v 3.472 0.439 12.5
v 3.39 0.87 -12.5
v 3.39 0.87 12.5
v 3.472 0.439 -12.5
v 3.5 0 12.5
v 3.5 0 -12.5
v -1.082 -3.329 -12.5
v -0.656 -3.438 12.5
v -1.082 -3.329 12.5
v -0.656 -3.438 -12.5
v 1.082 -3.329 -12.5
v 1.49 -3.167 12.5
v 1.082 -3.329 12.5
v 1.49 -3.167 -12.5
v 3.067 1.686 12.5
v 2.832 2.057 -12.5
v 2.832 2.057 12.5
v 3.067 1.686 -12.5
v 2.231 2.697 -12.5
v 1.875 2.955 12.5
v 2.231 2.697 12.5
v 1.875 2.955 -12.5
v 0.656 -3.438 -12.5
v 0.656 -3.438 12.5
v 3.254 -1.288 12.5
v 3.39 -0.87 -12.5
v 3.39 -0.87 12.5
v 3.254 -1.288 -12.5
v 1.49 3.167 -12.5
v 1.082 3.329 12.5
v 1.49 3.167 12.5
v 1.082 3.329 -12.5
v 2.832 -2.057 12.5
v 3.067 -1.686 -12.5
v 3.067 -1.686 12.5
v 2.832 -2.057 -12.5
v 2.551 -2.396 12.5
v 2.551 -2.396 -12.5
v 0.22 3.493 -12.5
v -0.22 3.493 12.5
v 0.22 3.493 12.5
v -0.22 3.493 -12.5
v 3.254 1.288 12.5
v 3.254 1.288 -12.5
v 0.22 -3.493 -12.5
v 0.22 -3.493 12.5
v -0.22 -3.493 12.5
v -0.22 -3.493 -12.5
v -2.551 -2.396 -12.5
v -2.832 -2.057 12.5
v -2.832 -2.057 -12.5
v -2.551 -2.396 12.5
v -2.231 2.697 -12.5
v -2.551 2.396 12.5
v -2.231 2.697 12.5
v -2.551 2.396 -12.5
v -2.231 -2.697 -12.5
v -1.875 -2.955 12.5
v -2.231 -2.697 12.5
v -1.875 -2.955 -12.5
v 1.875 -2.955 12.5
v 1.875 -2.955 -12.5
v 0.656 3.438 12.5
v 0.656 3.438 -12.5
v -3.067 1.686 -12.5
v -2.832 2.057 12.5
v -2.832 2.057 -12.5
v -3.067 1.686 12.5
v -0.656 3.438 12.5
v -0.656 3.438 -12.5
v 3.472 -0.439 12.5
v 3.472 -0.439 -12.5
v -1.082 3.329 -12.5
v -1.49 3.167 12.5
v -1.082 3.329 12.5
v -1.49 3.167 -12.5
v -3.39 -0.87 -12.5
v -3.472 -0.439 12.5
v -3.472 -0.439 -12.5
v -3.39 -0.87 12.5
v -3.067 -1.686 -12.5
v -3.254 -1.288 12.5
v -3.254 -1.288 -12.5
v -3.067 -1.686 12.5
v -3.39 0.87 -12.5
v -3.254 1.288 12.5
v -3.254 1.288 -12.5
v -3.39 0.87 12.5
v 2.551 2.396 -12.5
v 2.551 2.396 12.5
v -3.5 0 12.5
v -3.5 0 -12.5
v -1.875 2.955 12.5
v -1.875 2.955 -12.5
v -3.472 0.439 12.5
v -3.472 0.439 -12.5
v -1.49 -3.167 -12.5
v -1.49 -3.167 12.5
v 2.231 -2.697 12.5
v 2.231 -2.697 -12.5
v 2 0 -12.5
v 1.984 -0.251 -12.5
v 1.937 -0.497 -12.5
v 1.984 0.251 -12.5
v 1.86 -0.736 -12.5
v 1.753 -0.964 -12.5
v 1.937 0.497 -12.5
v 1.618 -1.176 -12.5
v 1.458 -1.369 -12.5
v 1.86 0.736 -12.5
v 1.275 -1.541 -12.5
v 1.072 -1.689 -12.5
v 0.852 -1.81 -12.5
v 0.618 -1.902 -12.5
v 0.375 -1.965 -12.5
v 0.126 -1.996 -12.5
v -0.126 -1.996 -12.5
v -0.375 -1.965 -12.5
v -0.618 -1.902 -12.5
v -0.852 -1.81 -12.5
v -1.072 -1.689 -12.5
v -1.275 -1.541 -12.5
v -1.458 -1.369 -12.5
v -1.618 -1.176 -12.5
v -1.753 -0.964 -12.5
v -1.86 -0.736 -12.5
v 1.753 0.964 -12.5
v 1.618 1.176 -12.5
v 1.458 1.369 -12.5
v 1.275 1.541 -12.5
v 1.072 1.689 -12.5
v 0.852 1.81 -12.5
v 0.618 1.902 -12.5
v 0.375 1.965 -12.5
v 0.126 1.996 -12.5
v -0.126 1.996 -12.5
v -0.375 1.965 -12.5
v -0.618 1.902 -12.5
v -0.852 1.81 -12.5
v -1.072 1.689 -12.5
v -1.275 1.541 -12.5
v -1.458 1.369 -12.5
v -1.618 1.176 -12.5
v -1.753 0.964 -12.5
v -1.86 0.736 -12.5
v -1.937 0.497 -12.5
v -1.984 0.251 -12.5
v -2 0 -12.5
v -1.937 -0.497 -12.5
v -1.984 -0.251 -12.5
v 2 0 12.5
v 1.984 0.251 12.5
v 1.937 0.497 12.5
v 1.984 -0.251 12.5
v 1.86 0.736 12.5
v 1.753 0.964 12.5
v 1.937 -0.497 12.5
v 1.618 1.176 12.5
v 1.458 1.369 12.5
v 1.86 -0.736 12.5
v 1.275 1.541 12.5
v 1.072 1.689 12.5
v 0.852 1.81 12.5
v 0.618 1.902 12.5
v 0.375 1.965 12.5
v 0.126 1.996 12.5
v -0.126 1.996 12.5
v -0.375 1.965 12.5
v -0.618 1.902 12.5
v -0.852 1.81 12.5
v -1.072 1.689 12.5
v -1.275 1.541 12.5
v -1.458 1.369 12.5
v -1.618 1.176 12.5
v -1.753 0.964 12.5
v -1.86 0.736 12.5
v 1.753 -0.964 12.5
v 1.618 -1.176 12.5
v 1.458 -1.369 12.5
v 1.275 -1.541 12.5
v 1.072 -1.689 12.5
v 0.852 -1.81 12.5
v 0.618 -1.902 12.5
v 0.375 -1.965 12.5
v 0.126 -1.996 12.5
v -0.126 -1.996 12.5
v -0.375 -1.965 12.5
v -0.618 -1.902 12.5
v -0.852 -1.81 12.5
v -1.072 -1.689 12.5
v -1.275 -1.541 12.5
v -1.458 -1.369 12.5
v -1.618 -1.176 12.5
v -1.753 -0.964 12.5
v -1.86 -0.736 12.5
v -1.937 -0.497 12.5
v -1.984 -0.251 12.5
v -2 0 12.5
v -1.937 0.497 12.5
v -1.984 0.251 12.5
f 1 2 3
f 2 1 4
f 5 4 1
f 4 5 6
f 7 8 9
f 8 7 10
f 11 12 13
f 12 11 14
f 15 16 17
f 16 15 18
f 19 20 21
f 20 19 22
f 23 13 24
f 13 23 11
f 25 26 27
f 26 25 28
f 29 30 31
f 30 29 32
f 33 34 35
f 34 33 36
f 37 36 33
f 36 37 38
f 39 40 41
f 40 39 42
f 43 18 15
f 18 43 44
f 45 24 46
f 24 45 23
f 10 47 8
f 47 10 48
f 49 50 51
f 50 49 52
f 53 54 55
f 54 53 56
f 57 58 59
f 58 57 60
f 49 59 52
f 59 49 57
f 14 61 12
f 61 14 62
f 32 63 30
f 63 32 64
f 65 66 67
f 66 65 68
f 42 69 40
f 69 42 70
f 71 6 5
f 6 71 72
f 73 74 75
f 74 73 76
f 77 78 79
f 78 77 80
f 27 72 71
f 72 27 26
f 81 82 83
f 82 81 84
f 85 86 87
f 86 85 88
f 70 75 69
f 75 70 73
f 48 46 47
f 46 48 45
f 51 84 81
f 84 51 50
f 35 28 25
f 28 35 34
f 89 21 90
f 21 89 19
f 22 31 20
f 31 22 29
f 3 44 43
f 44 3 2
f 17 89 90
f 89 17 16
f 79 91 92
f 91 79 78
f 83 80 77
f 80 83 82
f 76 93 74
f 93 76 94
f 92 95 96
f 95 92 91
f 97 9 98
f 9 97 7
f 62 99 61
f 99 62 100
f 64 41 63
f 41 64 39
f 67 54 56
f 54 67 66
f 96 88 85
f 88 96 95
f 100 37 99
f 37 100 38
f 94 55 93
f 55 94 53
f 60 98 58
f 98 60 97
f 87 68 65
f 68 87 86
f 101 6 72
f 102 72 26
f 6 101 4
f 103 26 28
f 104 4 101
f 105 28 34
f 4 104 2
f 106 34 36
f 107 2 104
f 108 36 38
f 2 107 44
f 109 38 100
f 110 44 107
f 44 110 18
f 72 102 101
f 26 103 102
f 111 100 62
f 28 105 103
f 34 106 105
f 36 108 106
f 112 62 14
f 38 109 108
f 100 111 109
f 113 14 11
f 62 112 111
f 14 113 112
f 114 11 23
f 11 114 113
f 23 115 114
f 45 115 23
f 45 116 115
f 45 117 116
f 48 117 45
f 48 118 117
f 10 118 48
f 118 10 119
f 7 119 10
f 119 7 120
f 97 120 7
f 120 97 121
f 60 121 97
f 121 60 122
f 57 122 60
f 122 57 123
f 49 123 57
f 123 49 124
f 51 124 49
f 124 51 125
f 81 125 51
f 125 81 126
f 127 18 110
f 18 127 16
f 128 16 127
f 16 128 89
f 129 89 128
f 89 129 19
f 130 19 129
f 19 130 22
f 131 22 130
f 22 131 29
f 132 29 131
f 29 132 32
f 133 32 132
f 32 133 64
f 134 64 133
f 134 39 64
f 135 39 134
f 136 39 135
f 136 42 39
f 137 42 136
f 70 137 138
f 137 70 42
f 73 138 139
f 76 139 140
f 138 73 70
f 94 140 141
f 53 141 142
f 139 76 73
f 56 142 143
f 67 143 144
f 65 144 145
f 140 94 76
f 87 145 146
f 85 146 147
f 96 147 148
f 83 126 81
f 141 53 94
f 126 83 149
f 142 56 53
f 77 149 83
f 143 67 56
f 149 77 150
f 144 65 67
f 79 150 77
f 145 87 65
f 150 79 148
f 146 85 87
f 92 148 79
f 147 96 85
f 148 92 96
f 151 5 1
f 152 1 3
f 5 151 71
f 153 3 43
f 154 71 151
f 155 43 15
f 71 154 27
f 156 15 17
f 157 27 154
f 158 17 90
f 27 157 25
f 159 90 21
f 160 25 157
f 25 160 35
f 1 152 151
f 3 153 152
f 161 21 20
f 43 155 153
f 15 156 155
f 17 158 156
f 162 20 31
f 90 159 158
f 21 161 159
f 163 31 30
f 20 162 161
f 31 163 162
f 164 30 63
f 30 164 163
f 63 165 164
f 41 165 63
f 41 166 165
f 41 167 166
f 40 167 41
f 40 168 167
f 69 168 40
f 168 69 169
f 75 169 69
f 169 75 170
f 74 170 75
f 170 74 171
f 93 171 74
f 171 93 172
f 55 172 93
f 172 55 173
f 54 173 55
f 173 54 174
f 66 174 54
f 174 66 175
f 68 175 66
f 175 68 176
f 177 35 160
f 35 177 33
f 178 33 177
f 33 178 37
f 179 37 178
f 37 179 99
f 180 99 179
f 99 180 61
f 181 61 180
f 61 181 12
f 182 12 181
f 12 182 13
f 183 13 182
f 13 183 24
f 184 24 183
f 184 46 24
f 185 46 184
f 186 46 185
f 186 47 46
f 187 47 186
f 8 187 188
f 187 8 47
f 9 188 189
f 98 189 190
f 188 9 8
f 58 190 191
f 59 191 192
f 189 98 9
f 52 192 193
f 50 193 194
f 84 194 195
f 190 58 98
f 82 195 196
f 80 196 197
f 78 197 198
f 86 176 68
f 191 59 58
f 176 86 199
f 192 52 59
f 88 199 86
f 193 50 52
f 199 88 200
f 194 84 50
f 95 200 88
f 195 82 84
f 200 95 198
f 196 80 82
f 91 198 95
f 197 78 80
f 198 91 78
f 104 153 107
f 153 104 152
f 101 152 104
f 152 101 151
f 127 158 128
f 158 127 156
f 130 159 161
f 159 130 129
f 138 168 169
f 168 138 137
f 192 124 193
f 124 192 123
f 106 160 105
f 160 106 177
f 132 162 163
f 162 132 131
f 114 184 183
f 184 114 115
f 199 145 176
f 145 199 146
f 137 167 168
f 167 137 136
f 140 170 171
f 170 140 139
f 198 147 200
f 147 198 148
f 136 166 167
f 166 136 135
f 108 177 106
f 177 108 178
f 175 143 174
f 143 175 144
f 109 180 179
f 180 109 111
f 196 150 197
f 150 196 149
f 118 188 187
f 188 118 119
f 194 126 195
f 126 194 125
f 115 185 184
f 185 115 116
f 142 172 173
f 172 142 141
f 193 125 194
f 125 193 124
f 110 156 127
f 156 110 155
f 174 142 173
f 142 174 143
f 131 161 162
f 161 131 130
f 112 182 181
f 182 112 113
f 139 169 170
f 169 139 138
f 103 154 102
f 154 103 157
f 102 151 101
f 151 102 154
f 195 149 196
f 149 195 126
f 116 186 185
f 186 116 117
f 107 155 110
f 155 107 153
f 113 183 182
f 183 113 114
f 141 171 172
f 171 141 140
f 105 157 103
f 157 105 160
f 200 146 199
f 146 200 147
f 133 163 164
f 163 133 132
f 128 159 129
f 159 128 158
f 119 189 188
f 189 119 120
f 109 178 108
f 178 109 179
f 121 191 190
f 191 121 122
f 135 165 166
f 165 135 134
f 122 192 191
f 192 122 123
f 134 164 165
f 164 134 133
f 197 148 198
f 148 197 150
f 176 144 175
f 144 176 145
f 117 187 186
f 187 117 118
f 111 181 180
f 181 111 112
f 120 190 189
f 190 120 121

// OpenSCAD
$fn = 50;


difference() {
	union() {
		translate(v = [0, 0, -12.5000000000]) {
			cylinder(h = 25, r = 3.5000000000);
		}
	}
	union() {
		translate(v = [0, 0, -100.0000000000]) {
			cylinder(h = 200, r = 2.0000000000);
		}
	}
}
